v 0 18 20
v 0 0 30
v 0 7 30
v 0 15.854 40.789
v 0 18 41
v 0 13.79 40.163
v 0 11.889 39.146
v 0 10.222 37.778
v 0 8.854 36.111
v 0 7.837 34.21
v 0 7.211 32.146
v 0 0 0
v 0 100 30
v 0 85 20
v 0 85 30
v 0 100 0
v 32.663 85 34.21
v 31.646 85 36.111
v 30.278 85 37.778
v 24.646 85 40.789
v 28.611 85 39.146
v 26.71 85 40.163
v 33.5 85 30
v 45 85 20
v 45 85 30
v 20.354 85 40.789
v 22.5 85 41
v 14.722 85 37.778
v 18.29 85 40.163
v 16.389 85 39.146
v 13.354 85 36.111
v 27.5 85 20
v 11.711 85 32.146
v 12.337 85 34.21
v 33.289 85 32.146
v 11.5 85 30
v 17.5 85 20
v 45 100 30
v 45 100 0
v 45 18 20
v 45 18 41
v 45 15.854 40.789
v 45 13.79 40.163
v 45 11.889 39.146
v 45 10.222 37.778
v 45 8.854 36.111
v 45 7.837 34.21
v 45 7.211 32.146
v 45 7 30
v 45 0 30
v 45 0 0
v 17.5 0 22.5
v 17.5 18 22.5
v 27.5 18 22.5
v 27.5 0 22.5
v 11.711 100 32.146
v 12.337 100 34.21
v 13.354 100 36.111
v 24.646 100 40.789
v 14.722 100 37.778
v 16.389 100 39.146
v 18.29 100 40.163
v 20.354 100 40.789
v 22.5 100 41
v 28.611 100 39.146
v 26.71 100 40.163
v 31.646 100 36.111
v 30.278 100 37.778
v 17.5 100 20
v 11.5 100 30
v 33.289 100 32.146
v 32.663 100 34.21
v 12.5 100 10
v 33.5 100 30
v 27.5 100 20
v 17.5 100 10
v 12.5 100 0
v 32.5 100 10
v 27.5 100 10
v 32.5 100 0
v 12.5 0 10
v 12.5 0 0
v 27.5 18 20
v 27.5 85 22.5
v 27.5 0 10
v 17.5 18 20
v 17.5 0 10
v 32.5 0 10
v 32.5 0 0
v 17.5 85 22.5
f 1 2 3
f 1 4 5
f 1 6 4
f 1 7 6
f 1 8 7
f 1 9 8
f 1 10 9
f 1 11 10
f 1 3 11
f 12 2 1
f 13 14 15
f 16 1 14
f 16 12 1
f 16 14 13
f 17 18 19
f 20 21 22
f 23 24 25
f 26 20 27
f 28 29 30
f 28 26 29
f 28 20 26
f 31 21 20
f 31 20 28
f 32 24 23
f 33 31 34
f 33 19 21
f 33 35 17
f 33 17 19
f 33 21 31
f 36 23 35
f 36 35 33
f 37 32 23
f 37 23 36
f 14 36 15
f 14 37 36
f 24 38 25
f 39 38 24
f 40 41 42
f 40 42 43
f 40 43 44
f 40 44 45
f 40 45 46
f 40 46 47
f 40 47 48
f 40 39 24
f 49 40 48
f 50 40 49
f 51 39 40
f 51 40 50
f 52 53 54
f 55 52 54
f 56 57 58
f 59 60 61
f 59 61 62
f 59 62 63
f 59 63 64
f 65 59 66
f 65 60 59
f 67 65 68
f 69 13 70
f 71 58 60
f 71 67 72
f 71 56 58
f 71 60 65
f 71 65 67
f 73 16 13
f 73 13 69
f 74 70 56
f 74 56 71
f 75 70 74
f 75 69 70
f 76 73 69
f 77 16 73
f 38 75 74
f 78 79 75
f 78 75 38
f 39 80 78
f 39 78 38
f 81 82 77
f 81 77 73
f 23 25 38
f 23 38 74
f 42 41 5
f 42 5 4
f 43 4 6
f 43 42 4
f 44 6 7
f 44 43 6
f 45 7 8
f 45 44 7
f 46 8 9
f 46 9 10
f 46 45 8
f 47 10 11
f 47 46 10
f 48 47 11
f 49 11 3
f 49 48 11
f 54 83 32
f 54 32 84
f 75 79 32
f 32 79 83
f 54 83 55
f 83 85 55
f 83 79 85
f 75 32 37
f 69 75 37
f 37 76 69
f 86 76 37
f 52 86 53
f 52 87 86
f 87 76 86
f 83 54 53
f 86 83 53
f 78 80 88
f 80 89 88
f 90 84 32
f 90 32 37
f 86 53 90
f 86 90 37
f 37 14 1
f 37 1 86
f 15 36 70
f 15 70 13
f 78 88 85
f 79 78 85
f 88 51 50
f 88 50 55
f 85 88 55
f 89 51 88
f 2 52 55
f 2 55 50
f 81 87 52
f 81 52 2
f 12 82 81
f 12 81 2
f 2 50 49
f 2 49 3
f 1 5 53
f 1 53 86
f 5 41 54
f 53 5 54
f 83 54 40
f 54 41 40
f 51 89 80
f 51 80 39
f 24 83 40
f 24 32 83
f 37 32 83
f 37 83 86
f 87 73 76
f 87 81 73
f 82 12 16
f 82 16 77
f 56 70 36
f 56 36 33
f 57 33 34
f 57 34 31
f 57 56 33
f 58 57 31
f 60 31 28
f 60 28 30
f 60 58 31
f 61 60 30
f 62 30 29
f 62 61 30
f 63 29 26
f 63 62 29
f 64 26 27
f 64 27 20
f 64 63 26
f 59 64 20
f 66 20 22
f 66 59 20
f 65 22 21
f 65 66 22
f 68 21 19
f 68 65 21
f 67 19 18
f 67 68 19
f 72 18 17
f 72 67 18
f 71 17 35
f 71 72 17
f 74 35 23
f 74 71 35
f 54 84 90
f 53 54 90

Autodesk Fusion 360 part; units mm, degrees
sketch "Sketch1" plane through (0, 0, 0) normal (0, 0, 1) x (1, 0, 0)
  line L0 (0, 0) -> (0, 100)
  line L1 (0, 100) -> (45, 100)
  line L2 (45, 100) -> (45, 0)
  line L3 (45, 0) -> (0, 0)
  dimension "d1" = 100
  dimension "d2" = 45
extrude "Extrude1" add sketch "Sketch1" along normal blind 35 makes body 1
extrude "Extrude2" cut 1 faces at (15, 33.3333, 35) along direction (0, 0, -1) blind 15 on bodies 1 bodies 1
sketch "Sketch2" plane through (0, 0, 20) normal (0, 0, 1) x (-1, 0, 0)
  line L0 (-45, -100) -> (0, -100)
  line L1 (0, -100) -> (0, 0)
  line L2 (0, 0) -> (-45, 0)
sketch "Sketch3" plane through (0, 0, 20) normal (0, 0, 1) x (-1, 0, 0)
sketch "Sketch4" plane through (0, 0, 20) normal (0, 0, 1) x (-1, 0, 0)
sketch "Sketch5" plane through (0, 0, 20) normal (0, 0, 1) x (-1, 0, 0)
  line L0 (0, 0) -> (0, -7)
  line L1 (0, -7) -> (-45, -7)
  line L2 (-45, -7) -> (-45, 0)
  line L3 (-45, 0) -> (0, 0)
extrude "Extrude3" add sketch "Sketch5" along normal blind 10 bodies 1
sketch "Sketch6" plane through (45, 0, 0) normal (1, 0, 0) x (0, 1, 0)
  line L0 (100, 20) -> (7, 20)
  line L1 (0, 30) -> (0, 0)
  line L2 (0, 0) -> (100, 0)
  line L3 (100, 0) -> (100, 20)
  circle A0 centre (18, 30) radius 11
  line L4 (7, 30) -> (18, 30)
  line L5 (18, 30) -> (18, 20)
  line L6 (18, 30) -> (18, 41)
  line L7 (7, 30) -> (7, 20)
  line L8 (18, 20) -> (18, 30)
extrude "Extrude4" add sketch "Sketch6" against normal blind 45 contours L0 A0 L4 L5 L8 | L0 A0 L7 | A0 L4 L6 bodies 1
sketch "Sketch7" plane through (0, 0, 20) normal (0, 0, 1) x (-1, 0, 0)
  line L0 (-45, -85) -> (0, -85)
  line L1 (0, -85) -> (0, -100)
  line L2 (0, -100) -> (-45, -100)
  line L3 (-45, -100) -> (-45, -85)
sketch "Sketch8" plane through (45, 0, 0) normal (1, 0, 0) x (0, 1, 0)
  line L0 (100, 20) -> (18, 20)
  line L1 (18, 20) -> (18, 41)
  arc A0 (18, 41) -> (7, 30) centre (18, 30) ccw
  line L2 (7, 30) -> (0, 30)
  line L3 (0, 30) -> (0, 0)
  line L4 (0, 0) -> (100, 0)
  line L5 (100, 0) -> (100, 20)
extrude "Extrude5" add sketch "Sketch7" along normal blind 10 bodies 1
sketch "Sketch9" plane through (0, 0, 20) normal (0, 0, 1) x (-1, 0, 0)
  line L0 (-45, -85) -> (0, -85)
  line L1 (0, -85) -> (0, -18)
  line L2 (0, -18) -> (-45, -18)
  line L3 (-45, -18) -> (-45, -85)
sketch "Sketch10" plane through (0, 85, 0) normal (0, -1, 0) x (1, 0, 0)
  line L0 (0, 20) -> (45, 20)
  line L1 (45, 20) -> (45, 30)
  line L2 (0, 30) -> (0, 20)
sketch "Sketch11" plane through (0, 100, 0) normal (0, 1, 0) x (-1, 0, 0)
  line L0 (-45, 30) -> (-45, 0)
  line L1 (-45, 0) -> (0, 0)
  line L2 (0, 0) -> (0, 30)
  line L3 (0, 30) -> (-45, 30)
sketch "Sketch12" plane through (0, 100, 0) normal (0, 1, 0) x (-1, 0, 0)
sketch "Sketch13" plane through (45, 0, 0) normal (1, 0, 0) x (0, 1, 0)
sketch "Sketch14" plane through (0, 100, 0) normal (0, 1, 0) x (-1, 0, 0)
sketch "Sketch15" plane through (45, 0, 0) normal (1, 0, 0) x (0, 1, 0)
sketch "Sketch16" plane through (0, 100, 0) normal (0, 1, 0) x (-1, 0, 0)
sketch "Sketch17" plane through (0, 100, 0) normal (0, 1, 0) x (-1, 0, 0)
  line L0 (-45, 30) -> (-22.5, 30)
  line L1 (-22.5, 30) -> (-11.5, 30)
  arc A0 (-11.5, 30) -> (-33.5, 30) centre (-22.5, 30) ccw
  dimension "d17" = 22.5
  dimension "d18" = 22
extrude "Extrude6" add sketch "Sketch17" against normal blind 15 bodies 1
sketch "Sketch18" plane through (0, 0, 20) normal (0, 0, 1) x (-1, 0, 0)
sketch "Sketch19" plane through (0, 0, 0) normal (0, -1, 0) x (1, 0, 0)
  line L0 (0, 30) -> (0, 0)
  line L1 (0, 0) -> (45, 0)
  line L2 (45, 0) -> (45, 30)
  line L3 (45, 30) -> (0, 30)
sketch "Sketch20" plane through (0, 0, 0) normal (0, -1, 0) x (1, 0, 0)
  line L0 (0, 0) -> (12.5, 0)
  line L1 (45, 0) -> (32.5, 0)
  line L2 (12.5, 0) -> (12.5, 10)
  line L3 (32.5, 0) -> (32.5, 10)
  line L4 (12.5, 10) -> (17.5, 10)
  line L5 (32.5, 10) -> (27.5, 10)
  line L6 (17.5, 10) -> (17.5, 22.5)
  line L7 (27.5, 10) -> (27.5, 22.5)
  line L8 (27.5, 22.5) -> (17.5, 22.5)
  line L9 (12.5, 0) -> (32.5, 0)
  line L10 (17.5, 22.5) -> (17.5, 20)
  line L11 (27.5, 20) -> (17.5, 20)
  line L12 (17.5, 22.5) -> (17.5, 20)
  dimension "d21" = 12.5
  dimension "d22" = 12.5
  dimension "d24" = 10
  dimension "d25" = 5
  dimension "d26" = 5
  dimension "d27" = 12.5
extrude "Extrude7" cut sketch "Sketch20" against normal blind 100 contours L2 L3 L4 L5 L6 L7 L9 L11 bodies 1
sketch "Sketch21" plane through (0, 0, 0) normal (0, -1, 0) x (1, 0, 0)
  line L0 (17.5, 20) -> (17.5, 22.5)
  line L1 (17.5, 22.5) -> (27.5, 22.5)
  line L2 (27.5, 22.5) -> (27.5, 20)
  line L3 (27.5, 20) -> (17.5, 20)
  dimension "d30" = 2.5
sketch "Sketch22" plane through (0, 0, 0) normal (0, -1, 0) x (1, 0, 0)
extrude "Extrude8" cut sketch "Sketch21" against normal up to surface (18 mm away) bodies 1
sketch "Sketch23" plane through (0, 18, 0) normal (0, 1, 0) x (-1, 0, 0)
  line L0 (-27.5, 20) -> (-27.5, 22.5)
  line L1 (-27.5, 22.5) -> (-17.5, 22.5)
  line L2 (-17.5, 22.5) -> (-17.5, 20)
  line L3 (-17.5, 20) -> (0, 20)
  line L4 (0, 20) -> (0, 41)
  line L5 (0, 41) -> (-45, 41)
  line L6 (-45, 41) -> (-45, 20)
  line L7 (-45, 20) -> (-27.5, 20)
  line L8 (-27.5, 20) -> (-27.5, 22.5)
  line L9 (-17.5, 22.5) -> (-17.5, 20)
  line L10 (-27.5, 20) -> (-17.5, 20)
extrude "Extrude9" add sketch "Sketch23" along normal blind 67 separate body contours L0 L1 L2 L8 L9 L10 makes body 2
